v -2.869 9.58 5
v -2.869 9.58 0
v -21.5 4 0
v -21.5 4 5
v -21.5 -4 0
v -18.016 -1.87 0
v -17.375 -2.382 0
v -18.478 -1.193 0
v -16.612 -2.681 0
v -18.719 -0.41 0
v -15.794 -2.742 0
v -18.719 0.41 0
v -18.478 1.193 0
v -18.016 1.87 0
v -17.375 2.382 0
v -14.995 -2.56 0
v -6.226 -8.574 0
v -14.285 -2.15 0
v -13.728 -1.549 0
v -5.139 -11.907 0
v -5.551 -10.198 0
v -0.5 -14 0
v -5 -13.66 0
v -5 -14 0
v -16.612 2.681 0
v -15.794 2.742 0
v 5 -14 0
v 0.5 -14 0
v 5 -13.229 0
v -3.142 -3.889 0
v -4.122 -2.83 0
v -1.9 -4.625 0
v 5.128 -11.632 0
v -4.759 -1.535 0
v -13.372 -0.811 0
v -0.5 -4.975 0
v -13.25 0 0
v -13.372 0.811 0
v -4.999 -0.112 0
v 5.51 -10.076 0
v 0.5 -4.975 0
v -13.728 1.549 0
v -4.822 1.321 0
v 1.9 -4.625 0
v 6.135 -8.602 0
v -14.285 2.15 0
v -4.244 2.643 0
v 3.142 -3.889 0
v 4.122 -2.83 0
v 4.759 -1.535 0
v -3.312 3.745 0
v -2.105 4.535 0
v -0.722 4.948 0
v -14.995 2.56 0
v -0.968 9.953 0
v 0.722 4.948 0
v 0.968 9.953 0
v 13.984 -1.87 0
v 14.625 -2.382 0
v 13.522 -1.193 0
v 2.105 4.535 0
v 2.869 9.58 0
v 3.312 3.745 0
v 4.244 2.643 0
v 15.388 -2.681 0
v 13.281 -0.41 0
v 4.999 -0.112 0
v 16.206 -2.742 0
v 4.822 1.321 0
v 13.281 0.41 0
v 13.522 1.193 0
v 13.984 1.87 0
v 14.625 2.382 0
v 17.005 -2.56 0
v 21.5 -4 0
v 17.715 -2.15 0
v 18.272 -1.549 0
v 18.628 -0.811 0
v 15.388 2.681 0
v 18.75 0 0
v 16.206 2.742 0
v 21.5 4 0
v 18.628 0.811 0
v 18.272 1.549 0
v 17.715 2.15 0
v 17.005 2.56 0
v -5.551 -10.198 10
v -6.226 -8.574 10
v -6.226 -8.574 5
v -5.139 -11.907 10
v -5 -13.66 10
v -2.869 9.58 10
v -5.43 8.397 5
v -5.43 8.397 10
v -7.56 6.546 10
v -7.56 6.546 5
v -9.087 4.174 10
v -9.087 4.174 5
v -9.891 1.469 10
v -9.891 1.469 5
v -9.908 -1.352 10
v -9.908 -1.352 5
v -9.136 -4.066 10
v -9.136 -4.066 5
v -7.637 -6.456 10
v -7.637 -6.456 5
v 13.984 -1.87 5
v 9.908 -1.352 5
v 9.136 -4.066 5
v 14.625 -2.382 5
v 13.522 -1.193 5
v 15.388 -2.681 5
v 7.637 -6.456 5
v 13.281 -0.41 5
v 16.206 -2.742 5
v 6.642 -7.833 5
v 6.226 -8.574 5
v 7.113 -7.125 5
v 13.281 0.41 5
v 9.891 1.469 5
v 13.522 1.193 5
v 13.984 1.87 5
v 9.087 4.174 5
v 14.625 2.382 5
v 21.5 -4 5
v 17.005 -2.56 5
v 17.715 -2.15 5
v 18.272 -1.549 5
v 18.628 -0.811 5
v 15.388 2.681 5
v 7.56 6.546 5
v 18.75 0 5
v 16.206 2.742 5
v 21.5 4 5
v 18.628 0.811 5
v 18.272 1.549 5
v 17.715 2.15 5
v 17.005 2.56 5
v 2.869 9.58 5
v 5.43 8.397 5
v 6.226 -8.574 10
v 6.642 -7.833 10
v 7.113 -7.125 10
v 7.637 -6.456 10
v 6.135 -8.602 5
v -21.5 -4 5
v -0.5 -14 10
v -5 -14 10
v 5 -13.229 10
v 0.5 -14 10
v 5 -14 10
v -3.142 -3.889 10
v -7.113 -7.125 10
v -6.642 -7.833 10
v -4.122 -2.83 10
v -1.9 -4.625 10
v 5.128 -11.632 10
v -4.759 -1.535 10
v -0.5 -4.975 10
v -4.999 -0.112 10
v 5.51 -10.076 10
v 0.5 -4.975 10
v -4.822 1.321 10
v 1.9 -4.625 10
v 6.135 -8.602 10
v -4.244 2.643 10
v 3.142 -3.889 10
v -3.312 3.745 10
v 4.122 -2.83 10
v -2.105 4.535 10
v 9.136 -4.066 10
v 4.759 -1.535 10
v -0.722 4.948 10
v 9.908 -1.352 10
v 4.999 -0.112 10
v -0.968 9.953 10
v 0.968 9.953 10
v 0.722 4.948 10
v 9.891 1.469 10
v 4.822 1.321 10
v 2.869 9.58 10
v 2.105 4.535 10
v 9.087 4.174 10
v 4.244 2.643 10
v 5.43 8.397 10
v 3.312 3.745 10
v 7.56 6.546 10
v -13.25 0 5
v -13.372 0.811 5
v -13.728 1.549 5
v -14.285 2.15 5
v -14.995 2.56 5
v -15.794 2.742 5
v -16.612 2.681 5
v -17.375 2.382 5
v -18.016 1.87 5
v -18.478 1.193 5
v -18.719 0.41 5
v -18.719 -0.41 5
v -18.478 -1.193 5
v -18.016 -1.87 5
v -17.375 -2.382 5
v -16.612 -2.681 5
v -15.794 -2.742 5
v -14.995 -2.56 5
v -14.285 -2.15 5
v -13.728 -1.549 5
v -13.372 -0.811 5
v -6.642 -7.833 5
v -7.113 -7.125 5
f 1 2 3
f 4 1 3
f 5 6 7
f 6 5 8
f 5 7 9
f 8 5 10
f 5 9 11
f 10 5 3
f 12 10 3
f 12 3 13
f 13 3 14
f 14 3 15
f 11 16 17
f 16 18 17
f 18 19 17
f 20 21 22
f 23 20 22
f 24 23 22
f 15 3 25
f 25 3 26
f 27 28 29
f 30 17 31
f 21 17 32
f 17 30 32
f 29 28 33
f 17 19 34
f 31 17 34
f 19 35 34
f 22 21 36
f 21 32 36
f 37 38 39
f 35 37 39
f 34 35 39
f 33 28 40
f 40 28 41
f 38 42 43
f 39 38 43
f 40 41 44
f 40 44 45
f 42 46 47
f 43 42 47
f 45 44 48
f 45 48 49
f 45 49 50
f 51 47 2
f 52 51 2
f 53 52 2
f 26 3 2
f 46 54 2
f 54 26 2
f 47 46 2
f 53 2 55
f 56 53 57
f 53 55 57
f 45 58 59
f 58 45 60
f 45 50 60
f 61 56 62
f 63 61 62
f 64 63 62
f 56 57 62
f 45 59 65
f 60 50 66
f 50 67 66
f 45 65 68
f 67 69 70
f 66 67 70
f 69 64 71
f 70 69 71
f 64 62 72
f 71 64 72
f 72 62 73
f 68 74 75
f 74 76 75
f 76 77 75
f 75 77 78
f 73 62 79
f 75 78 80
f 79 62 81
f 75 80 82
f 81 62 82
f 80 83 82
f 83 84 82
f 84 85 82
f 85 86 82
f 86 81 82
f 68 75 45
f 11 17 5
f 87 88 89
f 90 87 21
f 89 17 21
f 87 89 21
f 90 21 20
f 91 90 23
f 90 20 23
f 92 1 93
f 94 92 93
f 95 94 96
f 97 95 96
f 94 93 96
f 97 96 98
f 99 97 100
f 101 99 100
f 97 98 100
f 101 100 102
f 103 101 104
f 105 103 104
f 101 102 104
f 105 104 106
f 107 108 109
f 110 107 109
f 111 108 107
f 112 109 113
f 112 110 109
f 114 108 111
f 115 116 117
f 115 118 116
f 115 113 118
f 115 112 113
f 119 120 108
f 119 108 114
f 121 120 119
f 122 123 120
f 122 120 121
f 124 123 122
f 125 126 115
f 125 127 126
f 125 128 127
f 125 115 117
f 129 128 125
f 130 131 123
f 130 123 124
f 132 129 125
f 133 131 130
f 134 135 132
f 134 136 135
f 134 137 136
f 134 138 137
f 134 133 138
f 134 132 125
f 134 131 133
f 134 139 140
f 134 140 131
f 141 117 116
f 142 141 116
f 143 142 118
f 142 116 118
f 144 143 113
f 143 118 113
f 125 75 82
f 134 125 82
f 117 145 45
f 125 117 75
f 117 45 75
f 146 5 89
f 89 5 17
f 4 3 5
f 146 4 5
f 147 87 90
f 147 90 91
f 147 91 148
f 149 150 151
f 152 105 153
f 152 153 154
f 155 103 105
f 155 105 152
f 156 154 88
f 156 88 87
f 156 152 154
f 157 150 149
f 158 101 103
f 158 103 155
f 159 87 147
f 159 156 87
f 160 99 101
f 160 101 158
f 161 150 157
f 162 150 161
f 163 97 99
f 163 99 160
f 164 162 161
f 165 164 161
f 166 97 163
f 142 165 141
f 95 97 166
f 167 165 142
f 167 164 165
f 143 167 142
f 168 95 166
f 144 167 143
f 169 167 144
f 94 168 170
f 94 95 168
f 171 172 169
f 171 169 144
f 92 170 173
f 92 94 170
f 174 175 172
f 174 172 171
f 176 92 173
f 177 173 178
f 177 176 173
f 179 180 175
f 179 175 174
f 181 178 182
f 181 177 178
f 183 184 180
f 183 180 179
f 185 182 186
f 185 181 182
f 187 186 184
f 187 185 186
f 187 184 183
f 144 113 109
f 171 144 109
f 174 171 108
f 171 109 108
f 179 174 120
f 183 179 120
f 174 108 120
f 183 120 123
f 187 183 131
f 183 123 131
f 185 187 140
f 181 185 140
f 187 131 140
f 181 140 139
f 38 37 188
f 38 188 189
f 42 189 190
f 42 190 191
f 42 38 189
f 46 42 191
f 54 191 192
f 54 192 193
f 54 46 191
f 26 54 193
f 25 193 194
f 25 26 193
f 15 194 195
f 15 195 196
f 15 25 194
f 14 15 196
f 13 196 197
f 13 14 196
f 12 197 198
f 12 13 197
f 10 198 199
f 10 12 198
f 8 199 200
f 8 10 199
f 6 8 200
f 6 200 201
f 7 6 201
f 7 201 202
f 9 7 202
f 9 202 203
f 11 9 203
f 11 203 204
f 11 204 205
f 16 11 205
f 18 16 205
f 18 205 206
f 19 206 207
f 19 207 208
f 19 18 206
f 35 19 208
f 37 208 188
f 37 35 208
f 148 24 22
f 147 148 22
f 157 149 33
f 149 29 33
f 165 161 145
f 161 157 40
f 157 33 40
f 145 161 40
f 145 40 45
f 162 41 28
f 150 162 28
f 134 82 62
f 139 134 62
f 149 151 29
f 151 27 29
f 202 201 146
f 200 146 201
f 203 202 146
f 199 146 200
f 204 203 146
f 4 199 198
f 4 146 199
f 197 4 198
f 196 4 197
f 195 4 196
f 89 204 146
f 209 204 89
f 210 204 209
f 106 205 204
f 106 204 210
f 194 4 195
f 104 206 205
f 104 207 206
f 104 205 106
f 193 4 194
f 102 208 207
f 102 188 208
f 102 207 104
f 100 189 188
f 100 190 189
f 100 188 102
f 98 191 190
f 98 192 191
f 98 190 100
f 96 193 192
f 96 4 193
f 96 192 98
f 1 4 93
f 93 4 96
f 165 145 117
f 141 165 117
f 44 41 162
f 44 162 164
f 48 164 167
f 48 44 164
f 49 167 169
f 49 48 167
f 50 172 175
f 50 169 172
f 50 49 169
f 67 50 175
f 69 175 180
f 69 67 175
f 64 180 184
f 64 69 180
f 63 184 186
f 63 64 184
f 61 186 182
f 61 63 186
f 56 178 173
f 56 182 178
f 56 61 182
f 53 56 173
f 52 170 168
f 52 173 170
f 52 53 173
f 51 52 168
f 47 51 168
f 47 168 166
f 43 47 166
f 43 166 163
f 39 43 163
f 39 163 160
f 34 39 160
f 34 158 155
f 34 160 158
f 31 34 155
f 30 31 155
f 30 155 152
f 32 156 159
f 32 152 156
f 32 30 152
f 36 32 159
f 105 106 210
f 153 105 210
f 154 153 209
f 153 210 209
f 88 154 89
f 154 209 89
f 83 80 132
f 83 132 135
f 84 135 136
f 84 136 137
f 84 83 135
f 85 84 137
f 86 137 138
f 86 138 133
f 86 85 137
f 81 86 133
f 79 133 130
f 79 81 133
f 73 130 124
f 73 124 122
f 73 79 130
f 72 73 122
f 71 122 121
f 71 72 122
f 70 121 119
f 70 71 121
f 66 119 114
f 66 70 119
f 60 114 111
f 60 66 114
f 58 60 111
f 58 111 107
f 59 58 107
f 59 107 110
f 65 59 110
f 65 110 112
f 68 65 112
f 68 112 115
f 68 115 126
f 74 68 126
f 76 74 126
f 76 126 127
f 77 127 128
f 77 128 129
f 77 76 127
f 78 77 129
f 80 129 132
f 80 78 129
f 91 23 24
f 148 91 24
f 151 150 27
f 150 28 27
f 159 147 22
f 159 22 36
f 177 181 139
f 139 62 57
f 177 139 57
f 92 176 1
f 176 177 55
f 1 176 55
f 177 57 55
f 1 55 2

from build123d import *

# Parameters (mm, degrees)
SKETCH_1_R               = 2.75
EXTRUDE_4_DEPTH          = 5
EXTRUDE_5_DEPTH          = 5
EXTRUDE_START            = -10
SKETCH_6_R               = 5.188573112
EXTRUDE_6_DEPTH          = 10
CUT_EXTRUDE_1_DEPTH      = 28.536339626
CUT_EXTRUDE_1_DEPTH_BACK = 28.536339626


with BuildPart() as part:
    # Эскиз1 → Бобышка-Вытянуть4 (new body)
    with BuildSketch(Plane.XY):
        with BuildLine():
            Line((-21.5, 4), (-21.5, -4))
            Line((-21.5, -4), (-6.226230763, -8.574183073))
            ThreePointArc((-6.226230763, -8.574183073), (-5.310888369, -11.044106025), (-5, -13.659774106))
            Line((-5, -13.659774106), (-5, -14))
            Line((-5, -14), (-0.5, -14))
            Line((-0.5, -14), (-0.5, -5.164425519))
            ThreePointArc((-0.5, -5.164425519), (0, 5.188573112), (0.5, -5.164425519))
            Line((0.5, -5.164425519), (0.5, -14))
            Line((0.5, -14), (5, -14))
            Line((5, -14), (5, -13.228756555))
            ThreePointArc((5, -13.228756555), (5.287888706, -10.846552908), (6.134978844, -8.601511166))
            Line((6.134978844, -8.601511166), (21.5, -4))
            Line((21.5, -4), (21.5, 4))
            Line((21.5, 4), (2.868905356, 9.579633712))
            ThreePointArc((2.868905356, 9.579633712), (0, 10), (-2.868905356, 9.579633712))
            Line((-2.868905356, 9.579633712), (-21.5, 4))
        make_face()
        with Locations((-16, 0)):
            Circle(SKETCH_1_R, mode=Mode.SUBTRACT)
        with Locations((16, 0)):
            Circle(SKETCH_1_R, mode=Mode.SUBTRACT)
    extrude(amount=EXTRUDE_4_DEPTH)

    # Эскиз5 → Бобышка-Вытянуть5 (add)
    with BuildSketch(Plane.XY.offset(5)):
        with BuildLine():
            Line((-5, -14), (-0.5, -14))
            Line((-0.5, -14), (-0.5, -5.164425519))
            ThreePointArc((-0.5, -5.164425519), (-3.48762128, 3.841586749), (5.188573112, 0))
            ThreePointArc((5.188573112, 0), (3.841586749, -3.48762128), (0.5, -5.164425519))
            Line((0.5, -5.164425519), (0.5, -14))
            Line((0.5, -14), (5, -14))
            Line((5, -14), (5, -13.659774106))
            Line((5, -13.659774106), (5, -13.228756555))
            ThreePointArc((5, -13.228756555), (5.287888706, -10.846552908), (6.134978844, -8.601511166))
            Line((6.134978844, -8.601511166), (6.226230763, -8.574183073))
            ThreePointArc((6.226230763, -8.574183073), (6.870989069, -7.474637071), (7.636932983, -6.455792331))
            ThreePointArc((7.636932983, -6.455792331), (9.585242923, 2.850108438), (2.868905356, 9.579633712))
            ThreePointArc((2.868905356, 9.579633712), (0, 10), (-2.868905356, 9.579633712))
            ThreePointArc((-2.868905356, 9.579633712), (-9.585242923, 2.850108438), (-7.636932983, -6.455792331))
            ThreePointArc((-7.636932983, -6.455792331), (-6.870989069, -7.474637071), (-6.226230763, -8.574183073))
            ThreePointArc((-6.226230763, -8.574183073), (-5.310888369, -11.044106025), (-5, -13.659774106))
            Line((-5, -13.659774106), (-5, -14))
        make_face()
    extrude(amount=EXTRUDE_5_DEPTH)

    # Эскиз6 → Бобышка-Вытянуть6 (add)
    with BuildSketch(Plane.XY.offset(10).offset(EXTRUDE_START)):
        Circle(SKETCH_6_R)
    extrude(amount=EXTRUDE_6_DEPTH)

    # Эскиз7 → Вырез-Вытянуть1 (cut, two sides: drawn at the far end of the back side and taken through both)
    with BuildSketch(Plane.XY.offset(10).offset(-CUT_EXTRUDE_1_DEPTH_BACK)):
        with BuildLine():
            Line((-0.5, -4.974937186), (-0.5, -5.164425519))
            ThreePointArc((-0.5, -5.164425519), (0, -5.188573112), (0.5, -5.164425519))
            Line((0.5, -5.164425519), (0.5, -4.974937186))
            ThreePointArc((0.5, -4.974937186), (0, 5), (-0.5, -4.974937186))
        make_face()
    extrude(amount=CUT_EXTRUDE_1_DEPTH + CUT_EXTRUDE_1_DEPTH_BACK, mode=Mode.SUBTRACT)


solid = part.part
